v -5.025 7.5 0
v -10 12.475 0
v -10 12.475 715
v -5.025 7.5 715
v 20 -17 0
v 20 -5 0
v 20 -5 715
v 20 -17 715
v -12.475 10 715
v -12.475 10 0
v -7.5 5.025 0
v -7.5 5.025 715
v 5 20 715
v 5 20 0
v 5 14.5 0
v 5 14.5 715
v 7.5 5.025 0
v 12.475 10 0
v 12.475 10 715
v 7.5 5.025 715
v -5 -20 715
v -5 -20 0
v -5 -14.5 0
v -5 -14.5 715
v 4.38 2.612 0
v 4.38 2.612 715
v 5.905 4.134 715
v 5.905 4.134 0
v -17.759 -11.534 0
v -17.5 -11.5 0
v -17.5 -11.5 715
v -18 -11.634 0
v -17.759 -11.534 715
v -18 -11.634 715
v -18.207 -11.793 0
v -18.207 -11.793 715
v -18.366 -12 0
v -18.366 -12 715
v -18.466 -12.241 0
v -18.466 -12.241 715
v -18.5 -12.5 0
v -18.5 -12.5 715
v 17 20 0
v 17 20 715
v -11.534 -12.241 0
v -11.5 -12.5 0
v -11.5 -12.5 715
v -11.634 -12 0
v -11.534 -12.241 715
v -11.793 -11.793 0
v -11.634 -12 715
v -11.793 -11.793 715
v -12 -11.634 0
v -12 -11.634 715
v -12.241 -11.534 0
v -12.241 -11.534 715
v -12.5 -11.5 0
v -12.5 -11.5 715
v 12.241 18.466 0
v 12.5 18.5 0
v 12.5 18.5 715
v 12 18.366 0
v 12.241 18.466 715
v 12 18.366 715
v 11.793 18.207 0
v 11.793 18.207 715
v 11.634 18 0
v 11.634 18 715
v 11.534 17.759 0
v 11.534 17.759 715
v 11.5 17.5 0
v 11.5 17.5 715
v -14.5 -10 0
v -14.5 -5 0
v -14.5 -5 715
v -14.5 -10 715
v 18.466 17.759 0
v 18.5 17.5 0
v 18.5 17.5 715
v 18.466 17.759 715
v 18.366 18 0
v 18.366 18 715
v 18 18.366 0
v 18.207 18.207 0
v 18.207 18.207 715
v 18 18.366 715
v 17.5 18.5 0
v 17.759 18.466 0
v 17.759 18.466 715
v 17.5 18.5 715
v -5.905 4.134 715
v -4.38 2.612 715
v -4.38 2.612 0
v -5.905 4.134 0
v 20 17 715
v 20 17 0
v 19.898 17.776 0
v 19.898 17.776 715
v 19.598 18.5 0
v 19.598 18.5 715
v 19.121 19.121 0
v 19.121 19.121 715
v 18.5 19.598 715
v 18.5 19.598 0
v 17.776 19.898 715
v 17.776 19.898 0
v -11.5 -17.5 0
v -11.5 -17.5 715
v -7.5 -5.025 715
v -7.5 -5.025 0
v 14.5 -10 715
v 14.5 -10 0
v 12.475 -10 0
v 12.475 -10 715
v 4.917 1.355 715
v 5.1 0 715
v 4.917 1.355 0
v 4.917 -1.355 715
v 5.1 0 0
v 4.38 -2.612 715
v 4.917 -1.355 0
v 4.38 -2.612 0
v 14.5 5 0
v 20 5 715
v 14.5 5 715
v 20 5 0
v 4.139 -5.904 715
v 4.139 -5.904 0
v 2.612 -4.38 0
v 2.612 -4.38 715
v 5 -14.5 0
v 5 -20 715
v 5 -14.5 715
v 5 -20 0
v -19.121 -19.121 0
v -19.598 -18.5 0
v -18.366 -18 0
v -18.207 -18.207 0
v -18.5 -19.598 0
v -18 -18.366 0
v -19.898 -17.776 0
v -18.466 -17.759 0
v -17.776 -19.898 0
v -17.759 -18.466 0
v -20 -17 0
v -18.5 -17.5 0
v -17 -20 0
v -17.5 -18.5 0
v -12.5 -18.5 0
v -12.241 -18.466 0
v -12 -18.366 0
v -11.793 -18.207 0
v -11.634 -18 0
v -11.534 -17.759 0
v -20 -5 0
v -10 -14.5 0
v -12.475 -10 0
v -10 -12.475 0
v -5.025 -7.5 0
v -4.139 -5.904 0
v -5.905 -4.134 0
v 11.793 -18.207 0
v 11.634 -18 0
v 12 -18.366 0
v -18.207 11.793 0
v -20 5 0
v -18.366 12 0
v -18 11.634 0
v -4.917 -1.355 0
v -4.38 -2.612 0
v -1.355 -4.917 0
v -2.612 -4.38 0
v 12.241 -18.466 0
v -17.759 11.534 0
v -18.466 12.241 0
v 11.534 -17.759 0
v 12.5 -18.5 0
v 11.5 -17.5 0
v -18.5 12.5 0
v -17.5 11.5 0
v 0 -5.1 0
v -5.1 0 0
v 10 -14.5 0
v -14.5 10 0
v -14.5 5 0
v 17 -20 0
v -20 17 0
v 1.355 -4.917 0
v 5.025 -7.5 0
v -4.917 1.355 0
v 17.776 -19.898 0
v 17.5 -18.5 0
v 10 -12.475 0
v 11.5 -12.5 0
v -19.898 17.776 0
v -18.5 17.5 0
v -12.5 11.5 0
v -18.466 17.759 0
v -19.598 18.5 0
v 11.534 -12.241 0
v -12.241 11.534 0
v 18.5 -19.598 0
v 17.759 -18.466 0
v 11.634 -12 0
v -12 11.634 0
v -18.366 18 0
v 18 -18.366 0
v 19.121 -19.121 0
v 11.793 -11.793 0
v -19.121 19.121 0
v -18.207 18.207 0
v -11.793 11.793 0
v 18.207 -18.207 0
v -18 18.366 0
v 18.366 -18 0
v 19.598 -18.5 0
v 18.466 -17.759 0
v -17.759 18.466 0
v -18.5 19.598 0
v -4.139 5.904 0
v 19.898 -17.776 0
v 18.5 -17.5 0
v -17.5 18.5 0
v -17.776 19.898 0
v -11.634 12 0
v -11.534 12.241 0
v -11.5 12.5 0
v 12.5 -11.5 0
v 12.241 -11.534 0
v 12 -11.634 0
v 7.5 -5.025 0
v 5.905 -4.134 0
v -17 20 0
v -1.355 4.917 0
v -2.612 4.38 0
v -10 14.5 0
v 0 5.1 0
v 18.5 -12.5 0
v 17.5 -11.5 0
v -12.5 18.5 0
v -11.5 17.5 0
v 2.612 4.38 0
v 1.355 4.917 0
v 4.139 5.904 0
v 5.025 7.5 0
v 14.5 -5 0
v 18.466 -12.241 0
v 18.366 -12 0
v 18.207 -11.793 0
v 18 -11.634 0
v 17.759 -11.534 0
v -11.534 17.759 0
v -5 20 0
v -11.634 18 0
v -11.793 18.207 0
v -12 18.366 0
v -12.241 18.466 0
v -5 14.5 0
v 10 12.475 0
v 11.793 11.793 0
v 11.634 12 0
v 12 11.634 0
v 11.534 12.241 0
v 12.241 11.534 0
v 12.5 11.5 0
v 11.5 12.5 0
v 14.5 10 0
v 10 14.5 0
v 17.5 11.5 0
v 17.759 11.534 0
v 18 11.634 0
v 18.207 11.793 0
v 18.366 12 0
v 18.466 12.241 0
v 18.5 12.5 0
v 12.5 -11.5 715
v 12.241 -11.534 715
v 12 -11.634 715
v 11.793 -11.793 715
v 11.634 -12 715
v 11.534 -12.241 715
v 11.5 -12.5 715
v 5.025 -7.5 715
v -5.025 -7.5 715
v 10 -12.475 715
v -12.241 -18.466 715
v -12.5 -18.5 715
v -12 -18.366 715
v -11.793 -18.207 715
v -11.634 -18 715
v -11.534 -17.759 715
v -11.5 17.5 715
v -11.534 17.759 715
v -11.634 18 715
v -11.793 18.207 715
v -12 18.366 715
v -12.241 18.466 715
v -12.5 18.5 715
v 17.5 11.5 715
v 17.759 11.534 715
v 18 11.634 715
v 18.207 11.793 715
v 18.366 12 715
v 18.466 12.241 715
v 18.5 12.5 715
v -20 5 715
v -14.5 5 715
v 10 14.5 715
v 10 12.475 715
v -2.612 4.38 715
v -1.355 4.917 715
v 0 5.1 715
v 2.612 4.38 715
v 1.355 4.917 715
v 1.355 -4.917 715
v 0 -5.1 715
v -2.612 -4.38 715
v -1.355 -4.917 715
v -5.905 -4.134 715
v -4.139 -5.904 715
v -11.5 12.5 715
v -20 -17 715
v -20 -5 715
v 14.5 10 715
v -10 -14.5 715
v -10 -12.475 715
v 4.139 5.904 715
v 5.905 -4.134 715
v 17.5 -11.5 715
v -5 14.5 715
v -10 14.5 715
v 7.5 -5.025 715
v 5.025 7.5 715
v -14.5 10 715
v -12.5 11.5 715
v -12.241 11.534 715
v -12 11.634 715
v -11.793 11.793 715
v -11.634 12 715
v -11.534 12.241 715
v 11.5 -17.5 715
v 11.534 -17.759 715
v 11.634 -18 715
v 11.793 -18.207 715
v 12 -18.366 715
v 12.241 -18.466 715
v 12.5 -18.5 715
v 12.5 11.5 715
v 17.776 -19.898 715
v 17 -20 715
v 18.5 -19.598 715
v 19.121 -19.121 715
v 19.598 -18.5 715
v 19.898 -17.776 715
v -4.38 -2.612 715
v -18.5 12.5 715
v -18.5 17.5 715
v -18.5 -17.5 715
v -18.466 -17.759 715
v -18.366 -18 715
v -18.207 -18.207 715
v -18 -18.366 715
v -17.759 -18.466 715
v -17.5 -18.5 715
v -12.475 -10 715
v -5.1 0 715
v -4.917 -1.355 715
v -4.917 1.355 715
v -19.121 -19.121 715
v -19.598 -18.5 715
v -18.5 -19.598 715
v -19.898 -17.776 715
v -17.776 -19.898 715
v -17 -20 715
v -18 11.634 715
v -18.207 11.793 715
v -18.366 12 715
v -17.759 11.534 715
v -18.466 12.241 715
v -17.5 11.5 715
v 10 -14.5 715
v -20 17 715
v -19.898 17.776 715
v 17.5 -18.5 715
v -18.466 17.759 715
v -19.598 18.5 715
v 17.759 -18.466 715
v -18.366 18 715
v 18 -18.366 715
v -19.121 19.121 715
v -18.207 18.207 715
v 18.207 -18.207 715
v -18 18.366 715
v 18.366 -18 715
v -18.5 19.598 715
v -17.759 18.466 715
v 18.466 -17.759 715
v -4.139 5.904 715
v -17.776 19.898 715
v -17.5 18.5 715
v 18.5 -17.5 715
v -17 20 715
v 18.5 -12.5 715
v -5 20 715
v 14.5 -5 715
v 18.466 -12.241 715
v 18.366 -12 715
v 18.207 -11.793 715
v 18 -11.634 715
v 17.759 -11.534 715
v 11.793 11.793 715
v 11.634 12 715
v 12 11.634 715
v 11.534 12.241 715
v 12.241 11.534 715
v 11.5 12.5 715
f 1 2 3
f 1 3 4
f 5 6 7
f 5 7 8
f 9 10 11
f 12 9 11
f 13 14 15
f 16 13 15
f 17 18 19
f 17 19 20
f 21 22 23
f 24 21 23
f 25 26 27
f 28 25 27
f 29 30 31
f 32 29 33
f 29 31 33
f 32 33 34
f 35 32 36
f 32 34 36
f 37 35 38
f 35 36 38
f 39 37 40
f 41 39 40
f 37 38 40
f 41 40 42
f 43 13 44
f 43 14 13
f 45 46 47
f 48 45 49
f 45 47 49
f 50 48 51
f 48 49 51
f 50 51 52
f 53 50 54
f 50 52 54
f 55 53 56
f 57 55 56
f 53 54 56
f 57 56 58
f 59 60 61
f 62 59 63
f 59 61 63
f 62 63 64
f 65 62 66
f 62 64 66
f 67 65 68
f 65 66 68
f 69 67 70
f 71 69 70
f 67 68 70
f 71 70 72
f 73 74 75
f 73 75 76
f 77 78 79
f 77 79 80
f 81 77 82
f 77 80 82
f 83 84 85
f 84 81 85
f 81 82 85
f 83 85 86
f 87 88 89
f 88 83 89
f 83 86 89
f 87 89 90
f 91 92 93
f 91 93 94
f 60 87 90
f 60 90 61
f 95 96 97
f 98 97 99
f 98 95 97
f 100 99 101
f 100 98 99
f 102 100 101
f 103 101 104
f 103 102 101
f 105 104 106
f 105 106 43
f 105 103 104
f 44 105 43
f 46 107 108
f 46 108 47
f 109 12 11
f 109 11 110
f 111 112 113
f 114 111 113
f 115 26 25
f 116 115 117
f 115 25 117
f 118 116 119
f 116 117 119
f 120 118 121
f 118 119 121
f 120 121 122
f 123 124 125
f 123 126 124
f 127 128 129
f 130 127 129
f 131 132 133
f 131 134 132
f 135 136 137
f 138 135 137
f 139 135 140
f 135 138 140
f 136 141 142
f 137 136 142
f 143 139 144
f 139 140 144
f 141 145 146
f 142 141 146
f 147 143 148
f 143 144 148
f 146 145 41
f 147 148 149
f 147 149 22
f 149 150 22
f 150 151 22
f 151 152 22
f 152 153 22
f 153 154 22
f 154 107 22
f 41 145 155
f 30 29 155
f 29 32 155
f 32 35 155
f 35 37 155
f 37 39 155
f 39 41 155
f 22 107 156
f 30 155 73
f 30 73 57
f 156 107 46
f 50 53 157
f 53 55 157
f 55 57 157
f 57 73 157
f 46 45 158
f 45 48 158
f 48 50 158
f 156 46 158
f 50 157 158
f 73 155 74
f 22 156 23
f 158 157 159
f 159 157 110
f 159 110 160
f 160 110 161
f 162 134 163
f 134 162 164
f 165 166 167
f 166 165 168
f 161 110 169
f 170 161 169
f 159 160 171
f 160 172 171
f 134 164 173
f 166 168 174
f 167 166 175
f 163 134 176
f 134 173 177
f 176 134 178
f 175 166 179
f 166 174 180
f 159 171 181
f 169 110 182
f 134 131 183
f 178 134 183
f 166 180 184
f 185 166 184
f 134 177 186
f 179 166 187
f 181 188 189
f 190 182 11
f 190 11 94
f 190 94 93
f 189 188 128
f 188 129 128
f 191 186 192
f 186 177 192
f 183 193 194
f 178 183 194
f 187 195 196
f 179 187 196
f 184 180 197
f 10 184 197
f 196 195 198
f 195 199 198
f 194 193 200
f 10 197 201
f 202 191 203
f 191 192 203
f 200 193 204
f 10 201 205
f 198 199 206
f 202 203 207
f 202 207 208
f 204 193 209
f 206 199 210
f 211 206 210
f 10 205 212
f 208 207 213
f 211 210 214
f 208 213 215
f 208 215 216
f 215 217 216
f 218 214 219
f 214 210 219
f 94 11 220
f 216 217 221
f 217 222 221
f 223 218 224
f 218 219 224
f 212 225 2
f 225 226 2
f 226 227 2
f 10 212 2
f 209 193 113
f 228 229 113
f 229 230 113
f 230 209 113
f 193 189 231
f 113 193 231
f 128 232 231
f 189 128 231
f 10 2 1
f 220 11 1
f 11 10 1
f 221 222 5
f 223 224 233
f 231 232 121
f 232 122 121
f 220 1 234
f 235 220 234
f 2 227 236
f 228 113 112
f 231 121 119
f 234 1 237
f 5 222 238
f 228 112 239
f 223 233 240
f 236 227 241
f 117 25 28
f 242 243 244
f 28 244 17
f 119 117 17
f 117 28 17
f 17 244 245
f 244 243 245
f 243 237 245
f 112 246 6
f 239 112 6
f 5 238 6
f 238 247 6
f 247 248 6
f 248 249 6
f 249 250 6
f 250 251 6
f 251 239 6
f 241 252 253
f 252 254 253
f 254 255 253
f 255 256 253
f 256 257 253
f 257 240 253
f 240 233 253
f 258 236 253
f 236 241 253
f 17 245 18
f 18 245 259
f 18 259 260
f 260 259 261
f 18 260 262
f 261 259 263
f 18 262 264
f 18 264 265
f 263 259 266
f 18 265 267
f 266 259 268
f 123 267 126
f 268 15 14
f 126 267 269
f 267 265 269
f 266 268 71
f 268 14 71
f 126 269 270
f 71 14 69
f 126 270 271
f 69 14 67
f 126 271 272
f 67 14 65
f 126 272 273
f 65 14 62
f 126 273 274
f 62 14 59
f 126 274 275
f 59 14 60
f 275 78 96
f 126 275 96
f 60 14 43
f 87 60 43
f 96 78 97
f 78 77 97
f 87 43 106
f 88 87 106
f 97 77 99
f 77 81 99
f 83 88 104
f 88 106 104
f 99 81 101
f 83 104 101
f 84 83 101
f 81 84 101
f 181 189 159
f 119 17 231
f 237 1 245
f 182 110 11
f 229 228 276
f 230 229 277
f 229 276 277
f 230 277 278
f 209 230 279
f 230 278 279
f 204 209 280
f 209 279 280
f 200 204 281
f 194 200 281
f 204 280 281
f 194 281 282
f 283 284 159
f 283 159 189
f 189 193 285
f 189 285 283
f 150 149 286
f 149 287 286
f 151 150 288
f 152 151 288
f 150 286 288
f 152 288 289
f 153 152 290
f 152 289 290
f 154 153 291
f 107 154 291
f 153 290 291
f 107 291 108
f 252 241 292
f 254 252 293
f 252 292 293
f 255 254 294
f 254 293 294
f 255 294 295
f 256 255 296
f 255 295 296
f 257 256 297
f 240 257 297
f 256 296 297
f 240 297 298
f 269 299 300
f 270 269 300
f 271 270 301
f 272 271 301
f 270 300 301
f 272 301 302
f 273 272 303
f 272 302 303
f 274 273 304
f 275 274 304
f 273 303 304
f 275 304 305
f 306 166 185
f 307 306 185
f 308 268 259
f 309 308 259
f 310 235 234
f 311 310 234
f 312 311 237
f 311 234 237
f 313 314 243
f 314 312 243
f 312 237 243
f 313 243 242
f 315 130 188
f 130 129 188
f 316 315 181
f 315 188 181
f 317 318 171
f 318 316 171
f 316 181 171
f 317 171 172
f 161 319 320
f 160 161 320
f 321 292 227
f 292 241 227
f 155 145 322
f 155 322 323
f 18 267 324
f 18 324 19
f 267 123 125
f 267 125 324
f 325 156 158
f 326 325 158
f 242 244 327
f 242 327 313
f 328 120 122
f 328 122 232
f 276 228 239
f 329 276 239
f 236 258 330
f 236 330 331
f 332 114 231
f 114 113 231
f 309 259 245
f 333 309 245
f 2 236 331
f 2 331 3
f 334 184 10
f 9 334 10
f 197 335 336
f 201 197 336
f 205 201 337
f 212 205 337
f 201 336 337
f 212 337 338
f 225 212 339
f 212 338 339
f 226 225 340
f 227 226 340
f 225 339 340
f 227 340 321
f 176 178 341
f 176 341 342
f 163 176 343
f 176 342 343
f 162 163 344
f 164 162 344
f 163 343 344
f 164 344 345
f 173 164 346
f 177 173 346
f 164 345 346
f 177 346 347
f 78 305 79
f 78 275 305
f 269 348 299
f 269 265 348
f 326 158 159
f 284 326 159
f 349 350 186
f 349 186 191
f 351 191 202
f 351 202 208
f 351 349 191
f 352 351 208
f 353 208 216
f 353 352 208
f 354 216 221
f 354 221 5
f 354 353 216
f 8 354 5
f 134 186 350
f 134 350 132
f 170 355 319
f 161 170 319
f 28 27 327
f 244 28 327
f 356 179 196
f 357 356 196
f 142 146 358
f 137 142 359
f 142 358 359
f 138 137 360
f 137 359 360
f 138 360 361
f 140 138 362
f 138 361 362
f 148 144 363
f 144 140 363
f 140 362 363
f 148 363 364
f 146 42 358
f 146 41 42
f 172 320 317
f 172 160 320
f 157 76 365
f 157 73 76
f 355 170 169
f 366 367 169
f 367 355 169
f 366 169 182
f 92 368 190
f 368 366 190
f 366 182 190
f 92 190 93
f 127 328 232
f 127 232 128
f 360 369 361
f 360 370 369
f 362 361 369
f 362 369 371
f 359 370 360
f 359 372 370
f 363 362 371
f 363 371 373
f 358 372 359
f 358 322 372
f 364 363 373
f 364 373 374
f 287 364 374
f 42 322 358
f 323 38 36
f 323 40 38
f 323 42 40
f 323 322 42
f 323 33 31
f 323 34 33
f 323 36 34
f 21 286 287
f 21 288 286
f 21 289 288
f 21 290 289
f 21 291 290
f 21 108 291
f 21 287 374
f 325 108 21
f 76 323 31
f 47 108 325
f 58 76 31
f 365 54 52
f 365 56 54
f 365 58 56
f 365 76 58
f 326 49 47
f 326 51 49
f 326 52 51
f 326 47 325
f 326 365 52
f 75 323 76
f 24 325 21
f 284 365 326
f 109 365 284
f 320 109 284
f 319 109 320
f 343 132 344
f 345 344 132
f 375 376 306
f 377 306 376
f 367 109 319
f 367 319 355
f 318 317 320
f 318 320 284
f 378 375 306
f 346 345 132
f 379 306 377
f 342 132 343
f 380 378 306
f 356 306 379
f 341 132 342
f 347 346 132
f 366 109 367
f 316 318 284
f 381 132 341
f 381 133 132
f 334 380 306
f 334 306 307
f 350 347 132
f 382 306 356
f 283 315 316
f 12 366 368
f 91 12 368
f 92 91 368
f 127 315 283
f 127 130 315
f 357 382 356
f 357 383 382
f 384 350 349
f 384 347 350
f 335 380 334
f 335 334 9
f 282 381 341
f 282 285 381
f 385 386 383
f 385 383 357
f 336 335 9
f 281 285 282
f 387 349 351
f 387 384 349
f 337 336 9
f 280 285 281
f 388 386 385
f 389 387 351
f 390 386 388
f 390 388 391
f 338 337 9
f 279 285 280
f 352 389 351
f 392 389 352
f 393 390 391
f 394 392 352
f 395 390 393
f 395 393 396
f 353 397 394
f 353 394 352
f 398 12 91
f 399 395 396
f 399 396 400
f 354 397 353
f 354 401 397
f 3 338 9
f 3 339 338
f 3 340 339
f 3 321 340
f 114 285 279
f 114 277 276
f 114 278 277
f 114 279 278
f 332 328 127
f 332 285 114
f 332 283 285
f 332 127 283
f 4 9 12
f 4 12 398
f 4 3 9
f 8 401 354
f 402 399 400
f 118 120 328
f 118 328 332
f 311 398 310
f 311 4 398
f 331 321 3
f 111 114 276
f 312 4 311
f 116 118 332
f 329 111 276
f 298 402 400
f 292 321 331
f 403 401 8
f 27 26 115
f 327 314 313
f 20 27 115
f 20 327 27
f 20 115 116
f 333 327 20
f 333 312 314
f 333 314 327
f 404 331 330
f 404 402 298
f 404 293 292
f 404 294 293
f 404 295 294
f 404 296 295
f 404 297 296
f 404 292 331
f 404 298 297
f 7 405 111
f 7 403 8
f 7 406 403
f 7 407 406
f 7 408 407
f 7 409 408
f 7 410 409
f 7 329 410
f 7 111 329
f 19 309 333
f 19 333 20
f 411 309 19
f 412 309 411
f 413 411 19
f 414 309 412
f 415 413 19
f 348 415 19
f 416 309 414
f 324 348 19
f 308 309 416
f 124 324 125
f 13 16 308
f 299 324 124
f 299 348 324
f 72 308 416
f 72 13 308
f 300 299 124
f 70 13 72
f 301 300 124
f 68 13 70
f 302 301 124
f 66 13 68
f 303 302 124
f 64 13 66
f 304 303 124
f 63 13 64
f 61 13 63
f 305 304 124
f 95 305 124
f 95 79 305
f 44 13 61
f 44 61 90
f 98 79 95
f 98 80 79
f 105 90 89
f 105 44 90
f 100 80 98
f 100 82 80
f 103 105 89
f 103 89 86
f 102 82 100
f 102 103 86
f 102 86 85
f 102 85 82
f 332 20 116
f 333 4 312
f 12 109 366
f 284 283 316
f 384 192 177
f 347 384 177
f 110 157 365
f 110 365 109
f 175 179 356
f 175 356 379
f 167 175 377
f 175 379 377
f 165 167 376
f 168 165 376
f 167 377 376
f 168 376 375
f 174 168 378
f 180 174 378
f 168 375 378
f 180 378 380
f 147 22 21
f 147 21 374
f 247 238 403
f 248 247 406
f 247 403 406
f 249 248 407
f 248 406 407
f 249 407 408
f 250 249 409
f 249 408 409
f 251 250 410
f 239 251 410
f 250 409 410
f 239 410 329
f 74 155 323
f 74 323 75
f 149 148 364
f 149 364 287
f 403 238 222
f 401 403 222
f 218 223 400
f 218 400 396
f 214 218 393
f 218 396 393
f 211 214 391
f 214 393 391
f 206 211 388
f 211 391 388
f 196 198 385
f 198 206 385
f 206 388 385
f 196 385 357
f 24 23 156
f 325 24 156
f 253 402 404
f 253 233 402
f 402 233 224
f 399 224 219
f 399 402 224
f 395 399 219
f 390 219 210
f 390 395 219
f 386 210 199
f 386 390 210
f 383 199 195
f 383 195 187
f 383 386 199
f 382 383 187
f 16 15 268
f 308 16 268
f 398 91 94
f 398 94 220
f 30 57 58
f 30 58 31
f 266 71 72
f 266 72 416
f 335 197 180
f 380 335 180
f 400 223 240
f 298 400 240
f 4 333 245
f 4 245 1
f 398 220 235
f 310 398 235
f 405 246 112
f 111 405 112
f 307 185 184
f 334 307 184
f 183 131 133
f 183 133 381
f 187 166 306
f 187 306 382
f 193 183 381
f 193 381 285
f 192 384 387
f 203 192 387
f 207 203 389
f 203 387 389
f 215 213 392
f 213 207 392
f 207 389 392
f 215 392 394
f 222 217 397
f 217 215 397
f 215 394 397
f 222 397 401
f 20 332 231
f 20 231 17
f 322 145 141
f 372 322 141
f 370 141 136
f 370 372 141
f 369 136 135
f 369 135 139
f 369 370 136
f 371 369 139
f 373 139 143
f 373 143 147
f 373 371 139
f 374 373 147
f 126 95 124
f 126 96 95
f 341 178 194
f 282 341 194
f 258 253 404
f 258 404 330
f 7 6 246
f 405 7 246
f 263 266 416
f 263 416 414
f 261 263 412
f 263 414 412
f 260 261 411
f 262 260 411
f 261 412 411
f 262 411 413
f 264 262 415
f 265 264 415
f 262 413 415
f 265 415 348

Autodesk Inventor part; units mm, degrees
ref_plane "YZ Plane" through (0, 0, 0) normal (1, 0, 0) x (0, 1, 0)
ref_plane "XZ Plane" through (0, 0, 0) normal (0, 1, 0) x (-1, 0, 0)
ref_plane "XY Plane" through (0, 0, 0) normal (0, 0, 1) x (1, 0, 0)
sketch "T-Slot 4040 Base" plane through (0, 0, 0) normal (0, 0, 1) x (1, 0, 0)
  line L0 (-28, 0) -> (28, 0) construction
  line L1 (0, -28) -> (0, 28) construction
  circle A0 centre (0, 0) radius 5.1
  line L2 (-7.5, -7.5) -> (7.5, -7.5)
  line L3 (7.5, -7.5) -> (7.5, 7.5)
  line L4 (7.5, 7.5) -> (-7.5, 7.5)
  line L5 (-7.5, 7.5) -> (-7.5, -7.5)
  line L6 (-7.5, -7.5) -> (7.5, 7.5) construction
  line L7 (7.5, -7.5) -> (-7.5, 7.5) construction
  line L8 (-20, 20) -> (20, 20)
  line L9 (20, 20) -> (20, -20)
  line L10 (20, -20) -> (-20, -20)
  line L11 (-20, -20) -> (-20, 20)
  line L12 (-20, 20) -> (20, -20) construction
  line L13 (20, 20) -> (-20, -20) construction
  line L14 (20, 5) -> (14.5, 5)
  line L15 (14.5, 5) -> (14.5, 10)
  line L16 (14.5, 10) -> (12.4749, 10)
  line L17 (12.4749, 10) -> (7.5, 5.0251)
  line L18 (5, 20) -> (5, 14.5)
  line L19 (5, 14.5) -> (10, 14.5)
  line L20 (10, 14.5) -> (10, 12.4749)
  line L21 (10, 12.4749) -> (5.0251, 7.5)
  line L22 (18.5, 18.5) -> (11.5, 18.5)
  line L23 (11.5, 18.5) -> (11.5, 11.5)
  line L24 (11.5, 11.5) -> (18.5, 11.5)
  line L25 (18.5, 11.5) -> (18.5, 18.5)
  line L26 (18.5, 18.5) -> (11.5, 11.5) construction
  line L27 (11.5, 18.5) -> (18.5, 11.5) construction
  line L28 (3.0732, 1.3088) -> (4.38, 2.6125) construction
  line L29 (5.905, 4.1338) -> (4.1393, 5.9037)
  line L30 (4.1393, 5.9037) -> (2.6122, 4.3802)
  line L31 (1.3075, 3.0787) -> (3.0732, 1.3088) construction
  line L32 (3.0732, 1.3088) -> (4.1393, 5.9037) construction
  line L33 (5.905, 4.1338) -> (1.3075, 3.0787) construction
  line L34 (4.38, 2.6125) -> (5.905, 4.1338)
  line L35 (2.6122, 4.3802) -> (1.3075, 3.0787) construction
  line L36 (-20, 5) -> (-14.5, 5)
  line L37 (-14.5, 5) -> (-14.5, 10)
  line L38 (-14.5, 10) -> (-12.4749, 10)
  line L39 (-12.4749, 10) -> (-7.5, 5.0251)
  line L40 (-5, 20) -> (-5, 14.5)
  line L41 (-5, 14.5) -> (-10, 14.5)
  line L42 (-10, 14.5) -> (-10, 12.4749)
  line L43 (-10, 12.4749) -> (-5.0251, 7.5)
  line L44 (-18.5, 18.5) -> (-11.5, 18.5)
  line L45 (-11.5, 18.5) -> (-11.5, 11.5)
  line L46 (-11.5, 11.5) -> (-18.5, 11.5)
  line L47 (-18.5, 11.5) -> (-18.5, 18.5)
  line L48 (-5.905, 4.1338) -> (-4.1393, 5.9037)
  line L49 (-4.1393, 5.9037) -> (-2.6122, 4.3802)
  line L50 (-4.38, 2.6125) -> (-5.905, 4.1338)
  line L51 (7.5, -7.5) -> (-7.5, -7.5)
  line L52 (20, -5) -> (14.5, -5)
  line L53 (14.5, -5) -> (14.5, -10)
  line L54 (14.5, -10) -> (12.4749, -10)
  line L55 (12.4749, -10) -> (7.5, -5.0251)
  line L56 (5, -20) -> (5, -14.5)
  line L57 (5, -14.5) -> (10, -14.5)
  line L58 (10, -14.5) -> (10, -12.4749)
  line L59 (10, -12.4749) -> (5.0251, -7.5)
  line L60 (18.5, -18.5) -> (11.5, -18.5)
  line L61 (11.5, -18.5) -> (11.5, -11.5)
  line L62 (11.5, -11.5) -> (18.5, -11.5)
  line L63 (18.5, -11.5) -> (18.5, -18.5)
  line L64 (18.5, -18.5) -> (11.5, -11.5) construction
  line L65 (11.5, -18.5) -> (18.5, -11.5) construction
  line L66 (3.0732, -1.3088) -> (4.38, -2.6125) construction
  line L67 (5.905, -4.1338) -> (4.1393, -5.9037)
  line L68 (4.1393, -5.9037) -> (2.6122, -4.3802)
  line L69 (1.3075, -3.0787) -> (3.0732, -1.3088) construction
  line L70 (3.0732, -1.3088) -> (4.1393, -5.9037) construction
  line L71 (5.905, -4.1338) -> (1.3075, -3.0787) construction
  line L72 (4.38, -2.6125) -> (5.905, -4.1338)
  line L73 (2.6122, -4.3802) -> (1.3075, -3.0787) construction
  line L74 (-4.38, -2.6125) -> (-5.905, -4.1338)
  line L75 (-4.1393, -5.9037) -> (-2.6122, -4.3802)
  line L76 (-5.905, -4.1338) -> (-4.1393, -5.9037)
  line L77 (-12.4749, -10) -> (-7.5, -5.0251)
  line L78 (-10, -12.4749) -> (-5.0251, -7.5)
  line L79 (-10, -14.5) -> (-10, -12.4749)
  line L80 (-5, -14.5) -> (-10, -14.5)
  line L81 (-5, -20) -> (-5, -14.5)
  line L82 (-18.5, -18.5) -> (-11.5, -18.5)
  line L83 (-11.5, -18.5) -> (-11.5, -11.5)
  line L84 (-11.5, -11.5) -> (-18.5, -11.5)
  line L85 (-18.5, -11.5) -> (-18.5, -18.5)
  line L86 (-14.5, -10) -> (-12.4749, -10)
  line L87 (-14.5, -5) -> (-14.5, -10)
  line L88 (-20, -5) -> (-14.5, -5)
  point P0 (15, 15)
  point P1 (3.6062, 3.6062)
  point P2 (3.6062, 3.6062)
  point P3 (15, -15)
  point P4 (3.6062, -3.6062)
  point P5 (3.6062, -3.6062)
  dimension "d9" = 10.2
  dimension "d12" = 40
  dimension "d13" = 40
  dimension "d14" = 5.5
  dimension "d15" = 15
  dimension "d16" = 7
  dimension "d17" = 10
  dimension "d20" = 1.75
  dimension "d21" = 7
  dimension "d22" = 2
  dimension "d29" = 1.5
  dimension "d30" = 2.5
extrude "Extrusion1" add sketch "T-Slot 4040 Base" along normal blind 715 contours L5 L4 L3 L2 | L2 L78 L79 L80 L81 L10 L11 L88 L87 L86 L77 L5 | L2 L3 L55 L54 L53 L52 L9 L10 L56 L57 L58 L59 | L39 L38 L37 L36 L11 L8 L40 L41 L42 L43 L4 L5 | L3 L4 L21 L20 L19 L18 L8 L9 L14 L15 L16 L17
fillet "Rundung1" radius 1 16 edges at (11.5, 18.5, 357.5) (18.5, 18.5, 357.5) (18.5, 11.5, 357.5) (11.5, 11.5, 357.5) (-11.5, 18.5, 357.5) (-18.5, 18.5, 357.5) (-18.5, 11.5, 357.5) (-11.5, 11.5, 357.5) (-18.5, -11.5, 357.5) (-11.5, -11.5, 357.5) (-11.5, -18.5, 357.5) (-18.5, -18.5, 357.5) (11.5, -18.5, 357.5) (11.5, -11.5, 357.5) (18.5, -11.5, 357.5) (18.5, -18.5, 357.5)
fillet "Rundung2" radius 3 4 edges at (20, 20, 357.5) (20, -20, 357.5) (-20, -20, 357.5) (-20, 20, 357.5)
properties part number "T-SLOT 4040 B-Type 715mm"
